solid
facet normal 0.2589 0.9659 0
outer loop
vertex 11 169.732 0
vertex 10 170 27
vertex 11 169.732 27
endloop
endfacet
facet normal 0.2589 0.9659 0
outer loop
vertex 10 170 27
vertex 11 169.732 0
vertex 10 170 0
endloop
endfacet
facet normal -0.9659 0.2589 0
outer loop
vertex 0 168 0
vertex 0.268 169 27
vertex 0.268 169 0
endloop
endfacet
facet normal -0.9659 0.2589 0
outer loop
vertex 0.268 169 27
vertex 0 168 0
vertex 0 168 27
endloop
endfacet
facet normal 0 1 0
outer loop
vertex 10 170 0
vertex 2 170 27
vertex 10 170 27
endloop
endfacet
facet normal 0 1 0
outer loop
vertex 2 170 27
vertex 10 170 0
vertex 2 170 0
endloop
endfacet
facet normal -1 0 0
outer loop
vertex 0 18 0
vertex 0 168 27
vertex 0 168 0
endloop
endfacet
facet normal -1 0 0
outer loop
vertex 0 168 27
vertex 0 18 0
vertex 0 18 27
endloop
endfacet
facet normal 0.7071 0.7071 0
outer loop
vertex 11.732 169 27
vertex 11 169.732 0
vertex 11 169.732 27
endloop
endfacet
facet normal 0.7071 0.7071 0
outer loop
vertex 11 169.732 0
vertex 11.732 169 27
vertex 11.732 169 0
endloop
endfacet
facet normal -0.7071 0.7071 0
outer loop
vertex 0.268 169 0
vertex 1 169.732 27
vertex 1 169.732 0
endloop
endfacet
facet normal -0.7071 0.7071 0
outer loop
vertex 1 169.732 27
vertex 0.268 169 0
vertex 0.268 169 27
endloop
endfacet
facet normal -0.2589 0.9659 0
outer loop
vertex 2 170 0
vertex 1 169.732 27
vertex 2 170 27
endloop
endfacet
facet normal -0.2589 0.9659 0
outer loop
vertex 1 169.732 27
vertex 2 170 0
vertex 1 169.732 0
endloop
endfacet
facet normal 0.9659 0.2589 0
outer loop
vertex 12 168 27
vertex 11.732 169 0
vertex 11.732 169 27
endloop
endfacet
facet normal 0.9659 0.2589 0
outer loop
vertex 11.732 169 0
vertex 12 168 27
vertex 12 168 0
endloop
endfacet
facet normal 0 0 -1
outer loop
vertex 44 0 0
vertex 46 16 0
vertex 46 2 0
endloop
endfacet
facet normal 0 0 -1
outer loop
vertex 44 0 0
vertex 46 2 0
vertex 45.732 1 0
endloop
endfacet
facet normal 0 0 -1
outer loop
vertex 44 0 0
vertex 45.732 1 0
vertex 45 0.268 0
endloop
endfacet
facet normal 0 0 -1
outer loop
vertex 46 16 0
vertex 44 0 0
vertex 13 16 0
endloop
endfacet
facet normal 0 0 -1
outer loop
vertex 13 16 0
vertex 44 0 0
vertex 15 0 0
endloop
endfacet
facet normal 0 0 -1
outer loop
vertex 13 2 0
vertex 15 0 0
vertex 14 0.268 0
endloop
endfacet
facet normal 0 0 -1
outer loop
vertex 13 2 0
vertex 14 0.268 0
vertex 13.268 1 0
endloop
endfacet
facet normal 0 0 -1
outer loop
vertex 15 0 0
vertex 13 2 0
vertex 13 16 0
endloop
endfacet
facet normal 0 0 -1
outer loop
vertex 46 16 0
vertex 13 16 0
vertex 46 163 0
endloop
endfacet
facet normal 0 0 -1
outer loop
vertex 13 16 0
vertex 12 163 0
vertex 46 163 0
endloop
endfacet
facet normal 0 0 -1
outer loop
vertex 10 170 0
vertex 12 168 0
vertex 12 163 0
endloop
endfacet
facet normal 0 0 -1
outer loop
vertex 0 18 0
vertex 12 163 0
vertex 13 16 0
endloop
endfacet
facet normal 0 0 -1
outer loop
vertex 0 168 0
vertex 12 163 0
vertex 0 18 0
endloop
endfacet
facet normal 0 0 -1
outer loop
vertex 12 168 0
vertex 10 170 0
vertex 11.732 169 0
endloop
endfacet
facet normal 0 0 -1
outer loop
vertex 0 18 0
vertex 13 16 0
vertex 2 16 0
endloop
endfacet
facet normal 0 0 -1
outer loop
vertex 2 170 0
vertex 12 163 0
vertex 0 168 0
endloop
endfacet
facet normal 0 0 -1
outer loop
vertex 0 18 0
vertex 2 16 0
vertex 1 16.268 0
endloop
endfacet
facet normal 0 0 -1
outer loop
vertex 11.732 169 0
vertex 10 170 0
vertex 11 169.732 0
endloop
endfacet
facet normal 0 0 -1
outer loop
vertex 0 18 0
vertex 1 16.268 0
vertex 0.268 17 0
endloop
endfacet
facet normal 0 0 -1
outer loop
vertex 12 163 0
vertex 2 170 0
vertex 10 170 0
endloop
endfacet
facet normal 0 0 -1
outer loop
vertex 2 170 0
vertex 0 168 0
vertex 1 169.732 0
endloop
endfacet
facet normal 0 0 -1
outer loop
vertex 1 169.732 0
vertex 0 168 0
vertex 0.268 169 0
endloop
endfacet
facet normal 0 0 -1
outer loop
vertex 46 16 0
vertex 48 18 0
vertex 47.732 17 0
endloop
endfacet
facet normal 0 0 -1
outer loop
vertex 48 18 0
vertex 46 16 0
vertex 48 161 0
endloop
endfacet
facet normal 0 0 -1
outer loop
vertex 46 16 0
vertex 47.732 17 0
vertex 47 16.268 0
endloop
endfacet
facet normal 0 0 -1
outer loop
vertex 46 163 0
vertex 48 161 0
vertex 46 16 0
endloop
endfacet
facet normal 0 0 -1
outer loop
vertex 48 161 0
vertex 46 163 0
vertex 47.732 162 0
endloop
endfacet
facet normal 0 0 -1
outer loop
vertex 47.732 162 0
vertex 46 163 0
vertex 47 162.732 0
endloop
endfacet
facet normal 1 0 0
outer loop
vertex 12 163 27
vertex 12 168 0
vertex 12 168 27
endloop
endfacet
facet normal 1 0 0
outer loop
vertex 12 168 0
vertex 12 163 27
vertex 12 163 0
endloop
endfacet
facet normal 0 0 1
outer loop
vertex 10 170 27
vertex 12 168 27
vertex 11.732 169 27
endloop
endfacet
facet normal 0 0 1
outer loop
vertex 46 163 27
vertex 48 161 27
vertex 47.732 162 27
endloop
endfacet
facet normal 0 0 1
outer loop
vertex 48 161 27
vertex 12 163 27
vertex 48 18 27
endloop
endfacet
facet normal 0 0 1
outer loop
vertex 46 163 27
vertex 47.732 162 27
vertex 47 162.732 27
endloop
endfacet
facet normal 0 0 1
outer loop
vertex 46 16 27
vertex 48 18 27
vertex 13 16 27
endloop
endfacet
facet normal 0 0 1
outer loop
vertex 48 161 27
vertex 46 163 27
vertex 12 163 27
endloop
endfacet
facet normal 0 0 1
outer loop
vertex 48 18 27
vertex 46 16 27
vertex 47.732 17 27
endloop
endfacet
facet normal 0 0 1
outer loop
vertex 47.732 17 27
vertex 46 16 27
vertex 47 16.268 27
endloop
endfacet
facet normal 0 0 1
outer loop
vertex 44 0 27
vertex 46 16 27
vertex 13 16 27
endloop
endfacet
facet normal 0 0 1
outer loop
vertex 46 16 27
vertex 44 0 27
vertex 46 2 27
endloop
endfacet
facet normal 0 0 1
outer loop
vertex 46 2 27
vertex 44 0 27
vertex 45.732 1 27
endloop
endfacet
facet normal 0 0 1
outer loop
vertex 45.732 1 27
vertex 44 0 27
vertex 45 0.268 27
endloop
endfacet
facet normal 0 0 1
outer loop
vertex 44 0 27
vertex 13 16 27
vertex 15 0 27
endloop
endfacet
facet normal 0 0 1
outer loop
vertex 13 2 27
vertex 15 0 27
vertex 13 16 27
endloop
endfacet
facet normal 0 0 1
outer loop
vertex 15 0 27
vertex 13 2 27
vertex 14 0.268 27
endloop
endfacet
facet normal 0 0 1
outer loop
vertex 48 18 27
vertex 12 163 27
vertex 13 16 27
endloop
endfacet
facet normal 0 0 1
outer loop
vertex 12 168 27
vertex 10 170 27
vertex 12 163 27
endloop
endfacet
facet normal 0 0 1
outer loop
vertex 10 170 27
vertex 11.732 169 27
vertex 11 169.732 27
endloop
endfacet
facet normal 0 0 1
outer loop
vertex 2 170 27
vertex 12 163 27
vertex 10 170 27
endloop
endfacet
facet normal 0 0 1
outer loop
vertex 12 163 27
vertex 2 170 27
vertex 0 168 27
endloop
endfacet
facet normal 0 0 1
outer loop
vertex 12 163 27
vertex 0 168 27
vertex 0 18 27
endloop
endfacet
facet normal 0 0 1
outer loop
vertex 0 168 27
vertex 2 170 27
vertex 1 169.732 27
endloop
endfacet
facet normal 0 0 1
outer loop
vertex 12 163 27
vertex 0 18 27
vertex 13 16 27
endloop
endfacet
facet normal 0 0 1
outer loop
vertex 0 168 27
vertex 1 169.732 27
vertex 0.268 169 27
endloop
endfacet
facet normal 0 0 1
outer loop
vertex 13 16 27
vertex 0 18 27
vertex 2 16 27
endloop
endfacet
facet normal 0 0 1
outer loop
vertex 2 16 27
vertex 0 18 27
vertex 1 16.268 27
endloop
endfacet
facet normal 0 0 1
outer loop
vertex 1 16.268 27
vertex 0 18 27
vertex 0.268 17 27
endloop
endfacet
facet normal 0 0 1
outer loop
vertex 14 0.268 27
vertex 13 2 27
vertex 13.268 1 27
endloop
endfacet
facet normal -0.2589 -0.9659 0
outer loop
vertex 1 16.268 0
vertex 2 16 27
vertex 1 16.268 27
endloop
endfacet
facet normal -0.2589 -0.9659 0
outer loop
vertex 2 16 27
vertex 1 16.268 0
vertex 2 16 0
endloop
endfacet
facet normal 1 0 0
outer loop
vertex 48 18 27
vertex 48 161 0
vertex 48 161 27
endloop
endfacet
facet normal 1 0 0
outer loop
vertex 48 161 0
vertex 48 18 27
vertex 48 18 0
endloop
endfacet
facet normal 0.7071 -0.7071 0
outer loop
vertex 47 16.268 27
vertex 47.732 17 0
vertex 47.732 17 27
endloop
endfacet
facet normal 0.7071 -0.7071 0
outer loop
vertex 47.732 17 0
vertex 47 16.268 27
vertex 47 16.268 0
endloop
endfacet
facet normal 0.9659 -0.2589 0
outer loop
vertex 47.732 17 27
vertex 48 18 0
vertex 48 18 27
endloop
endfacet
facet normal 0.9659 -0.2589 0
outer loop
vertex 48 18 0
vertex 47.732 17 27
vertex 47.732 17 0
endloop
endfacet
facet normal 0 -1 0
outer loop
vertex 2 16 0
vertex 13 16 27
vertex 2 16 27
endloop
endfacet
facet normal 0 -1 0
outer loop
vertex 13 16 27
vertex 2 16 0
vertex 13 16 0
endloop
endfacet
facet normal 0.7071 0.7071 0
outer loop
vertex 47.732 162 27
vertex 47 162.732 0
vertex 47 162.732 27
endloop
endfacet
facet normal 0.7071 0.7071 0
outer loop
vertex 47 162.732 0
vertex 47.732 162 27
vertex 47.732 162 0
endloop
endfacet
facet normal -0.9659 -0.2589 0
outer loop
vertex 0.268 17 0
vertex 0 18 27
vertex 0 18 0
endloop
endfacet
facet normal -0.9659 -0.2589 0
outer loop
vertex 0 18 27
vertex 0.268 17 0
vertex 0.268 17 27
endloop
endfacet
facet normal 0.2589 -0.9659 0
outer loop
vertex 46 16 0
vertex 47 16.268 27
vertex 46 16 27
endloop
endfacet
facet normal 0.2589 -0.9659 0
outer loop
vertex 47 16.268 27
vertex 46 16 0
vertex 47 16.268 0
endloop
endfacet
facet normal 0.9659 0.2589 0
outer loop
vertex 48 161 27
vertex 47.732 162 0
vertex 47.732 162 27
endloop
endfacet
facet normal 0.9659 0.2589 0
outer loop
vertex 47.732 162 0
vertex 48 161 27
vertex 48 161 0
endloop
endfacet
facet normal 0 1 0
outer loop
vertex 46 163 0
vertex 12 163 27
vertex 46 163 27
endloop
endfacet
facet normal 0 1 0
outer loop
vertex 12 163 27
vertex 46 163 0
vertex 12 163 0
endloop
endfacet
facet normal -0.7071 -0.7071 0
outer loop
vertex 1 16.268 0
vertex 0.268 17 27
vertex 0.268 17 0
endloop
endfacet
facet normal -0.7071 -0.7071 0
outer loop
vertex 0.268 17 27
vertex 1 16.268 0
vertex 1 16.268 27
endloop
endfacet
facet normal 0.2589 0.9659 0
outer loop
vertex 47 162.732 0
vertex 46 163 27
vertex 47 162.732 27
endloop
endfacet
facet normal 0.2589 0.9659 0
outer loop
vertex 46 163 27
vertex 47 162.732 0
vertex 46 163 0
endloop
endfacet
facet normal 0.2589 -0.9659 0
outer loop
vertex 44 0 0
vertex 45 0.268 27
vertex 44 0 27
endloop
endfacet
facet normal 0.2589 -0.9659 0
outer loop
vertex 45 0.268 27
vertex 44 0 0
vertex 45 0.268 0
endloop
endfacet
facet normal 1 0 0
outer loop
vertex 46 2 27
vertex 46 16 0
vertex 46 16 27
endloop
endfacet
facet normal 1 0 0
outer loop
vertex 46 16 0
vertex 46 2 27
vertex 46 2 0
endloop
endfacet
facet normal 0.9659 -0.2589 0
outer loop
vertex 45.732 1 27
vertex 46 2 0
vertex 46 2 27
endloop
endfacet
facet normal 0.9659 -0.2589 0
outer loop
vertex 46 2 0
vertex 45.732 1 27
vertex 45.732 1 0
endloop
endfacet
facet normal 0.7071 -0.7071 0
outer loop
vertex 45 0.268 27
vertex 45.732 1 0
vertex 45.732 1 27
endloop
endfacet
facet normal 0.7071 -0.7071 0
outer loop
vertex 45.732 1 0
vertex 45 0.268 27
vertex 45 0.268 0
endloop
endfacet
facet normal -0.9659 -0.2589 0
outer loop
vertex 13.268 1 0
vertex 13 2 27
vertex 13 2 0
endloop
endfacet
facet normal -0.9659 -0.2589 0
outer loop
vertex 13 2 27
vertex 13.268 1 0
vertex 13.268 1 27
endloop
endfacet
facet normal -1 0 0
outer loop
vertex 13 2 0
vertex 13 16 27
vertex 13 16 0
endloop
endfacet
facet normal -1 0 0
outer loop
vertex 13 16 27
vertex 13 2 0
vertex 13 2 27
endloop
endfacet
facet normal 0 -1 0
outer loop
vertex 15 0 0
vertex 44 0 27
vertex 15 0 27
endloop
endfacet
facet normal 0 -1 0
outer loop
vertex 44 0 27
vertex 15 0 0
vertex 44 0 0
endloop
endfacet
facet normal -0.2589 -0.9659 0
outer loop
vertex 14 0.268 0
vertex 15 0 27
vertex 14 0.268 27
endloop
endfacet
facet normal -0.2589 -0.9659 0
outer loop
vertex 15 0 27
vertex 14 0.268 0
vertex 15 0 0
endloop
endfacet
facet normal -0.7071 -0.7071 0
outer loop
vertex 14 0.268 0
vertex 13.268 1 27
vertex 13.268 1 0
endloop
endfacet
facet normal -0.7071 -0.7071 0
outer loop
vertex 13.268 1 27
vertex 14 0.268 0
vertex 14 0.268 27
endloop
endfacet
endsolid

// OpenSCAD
width = 27;
corner_r = 2;

$fn=12;

scale([1, 1, width/2]) minkowski() {
    translate([corner_r, corner_r, 0]) difference() {
        cube([48-2*corner_r, 170-2*corner_r, 1], center=false);
        translate([10-corner_r, 161-corner_r, 0]) cube([38, 9, 1], center=false);
        cube([13, 16, 1]);
        translate([46-2*corner_r, 0, 0]) cube([2, 16, 1]);
    }

    translate([0, 0, 0.5]) cylinder(h=1, r=corner_r, center=true);
}

// this is the bounding box
//mirror([1, 0, 0]) rotate([180, -90, 180]) difference() {
//    cube([width, 170, 48], center=false);
//    translate([0, 161, 10]) cube([width, 9, 38], center=false);
//    cube([width, 16, 13]);
//    translate([0, 0, 46]) cube([width, 16, 2]);
//};
